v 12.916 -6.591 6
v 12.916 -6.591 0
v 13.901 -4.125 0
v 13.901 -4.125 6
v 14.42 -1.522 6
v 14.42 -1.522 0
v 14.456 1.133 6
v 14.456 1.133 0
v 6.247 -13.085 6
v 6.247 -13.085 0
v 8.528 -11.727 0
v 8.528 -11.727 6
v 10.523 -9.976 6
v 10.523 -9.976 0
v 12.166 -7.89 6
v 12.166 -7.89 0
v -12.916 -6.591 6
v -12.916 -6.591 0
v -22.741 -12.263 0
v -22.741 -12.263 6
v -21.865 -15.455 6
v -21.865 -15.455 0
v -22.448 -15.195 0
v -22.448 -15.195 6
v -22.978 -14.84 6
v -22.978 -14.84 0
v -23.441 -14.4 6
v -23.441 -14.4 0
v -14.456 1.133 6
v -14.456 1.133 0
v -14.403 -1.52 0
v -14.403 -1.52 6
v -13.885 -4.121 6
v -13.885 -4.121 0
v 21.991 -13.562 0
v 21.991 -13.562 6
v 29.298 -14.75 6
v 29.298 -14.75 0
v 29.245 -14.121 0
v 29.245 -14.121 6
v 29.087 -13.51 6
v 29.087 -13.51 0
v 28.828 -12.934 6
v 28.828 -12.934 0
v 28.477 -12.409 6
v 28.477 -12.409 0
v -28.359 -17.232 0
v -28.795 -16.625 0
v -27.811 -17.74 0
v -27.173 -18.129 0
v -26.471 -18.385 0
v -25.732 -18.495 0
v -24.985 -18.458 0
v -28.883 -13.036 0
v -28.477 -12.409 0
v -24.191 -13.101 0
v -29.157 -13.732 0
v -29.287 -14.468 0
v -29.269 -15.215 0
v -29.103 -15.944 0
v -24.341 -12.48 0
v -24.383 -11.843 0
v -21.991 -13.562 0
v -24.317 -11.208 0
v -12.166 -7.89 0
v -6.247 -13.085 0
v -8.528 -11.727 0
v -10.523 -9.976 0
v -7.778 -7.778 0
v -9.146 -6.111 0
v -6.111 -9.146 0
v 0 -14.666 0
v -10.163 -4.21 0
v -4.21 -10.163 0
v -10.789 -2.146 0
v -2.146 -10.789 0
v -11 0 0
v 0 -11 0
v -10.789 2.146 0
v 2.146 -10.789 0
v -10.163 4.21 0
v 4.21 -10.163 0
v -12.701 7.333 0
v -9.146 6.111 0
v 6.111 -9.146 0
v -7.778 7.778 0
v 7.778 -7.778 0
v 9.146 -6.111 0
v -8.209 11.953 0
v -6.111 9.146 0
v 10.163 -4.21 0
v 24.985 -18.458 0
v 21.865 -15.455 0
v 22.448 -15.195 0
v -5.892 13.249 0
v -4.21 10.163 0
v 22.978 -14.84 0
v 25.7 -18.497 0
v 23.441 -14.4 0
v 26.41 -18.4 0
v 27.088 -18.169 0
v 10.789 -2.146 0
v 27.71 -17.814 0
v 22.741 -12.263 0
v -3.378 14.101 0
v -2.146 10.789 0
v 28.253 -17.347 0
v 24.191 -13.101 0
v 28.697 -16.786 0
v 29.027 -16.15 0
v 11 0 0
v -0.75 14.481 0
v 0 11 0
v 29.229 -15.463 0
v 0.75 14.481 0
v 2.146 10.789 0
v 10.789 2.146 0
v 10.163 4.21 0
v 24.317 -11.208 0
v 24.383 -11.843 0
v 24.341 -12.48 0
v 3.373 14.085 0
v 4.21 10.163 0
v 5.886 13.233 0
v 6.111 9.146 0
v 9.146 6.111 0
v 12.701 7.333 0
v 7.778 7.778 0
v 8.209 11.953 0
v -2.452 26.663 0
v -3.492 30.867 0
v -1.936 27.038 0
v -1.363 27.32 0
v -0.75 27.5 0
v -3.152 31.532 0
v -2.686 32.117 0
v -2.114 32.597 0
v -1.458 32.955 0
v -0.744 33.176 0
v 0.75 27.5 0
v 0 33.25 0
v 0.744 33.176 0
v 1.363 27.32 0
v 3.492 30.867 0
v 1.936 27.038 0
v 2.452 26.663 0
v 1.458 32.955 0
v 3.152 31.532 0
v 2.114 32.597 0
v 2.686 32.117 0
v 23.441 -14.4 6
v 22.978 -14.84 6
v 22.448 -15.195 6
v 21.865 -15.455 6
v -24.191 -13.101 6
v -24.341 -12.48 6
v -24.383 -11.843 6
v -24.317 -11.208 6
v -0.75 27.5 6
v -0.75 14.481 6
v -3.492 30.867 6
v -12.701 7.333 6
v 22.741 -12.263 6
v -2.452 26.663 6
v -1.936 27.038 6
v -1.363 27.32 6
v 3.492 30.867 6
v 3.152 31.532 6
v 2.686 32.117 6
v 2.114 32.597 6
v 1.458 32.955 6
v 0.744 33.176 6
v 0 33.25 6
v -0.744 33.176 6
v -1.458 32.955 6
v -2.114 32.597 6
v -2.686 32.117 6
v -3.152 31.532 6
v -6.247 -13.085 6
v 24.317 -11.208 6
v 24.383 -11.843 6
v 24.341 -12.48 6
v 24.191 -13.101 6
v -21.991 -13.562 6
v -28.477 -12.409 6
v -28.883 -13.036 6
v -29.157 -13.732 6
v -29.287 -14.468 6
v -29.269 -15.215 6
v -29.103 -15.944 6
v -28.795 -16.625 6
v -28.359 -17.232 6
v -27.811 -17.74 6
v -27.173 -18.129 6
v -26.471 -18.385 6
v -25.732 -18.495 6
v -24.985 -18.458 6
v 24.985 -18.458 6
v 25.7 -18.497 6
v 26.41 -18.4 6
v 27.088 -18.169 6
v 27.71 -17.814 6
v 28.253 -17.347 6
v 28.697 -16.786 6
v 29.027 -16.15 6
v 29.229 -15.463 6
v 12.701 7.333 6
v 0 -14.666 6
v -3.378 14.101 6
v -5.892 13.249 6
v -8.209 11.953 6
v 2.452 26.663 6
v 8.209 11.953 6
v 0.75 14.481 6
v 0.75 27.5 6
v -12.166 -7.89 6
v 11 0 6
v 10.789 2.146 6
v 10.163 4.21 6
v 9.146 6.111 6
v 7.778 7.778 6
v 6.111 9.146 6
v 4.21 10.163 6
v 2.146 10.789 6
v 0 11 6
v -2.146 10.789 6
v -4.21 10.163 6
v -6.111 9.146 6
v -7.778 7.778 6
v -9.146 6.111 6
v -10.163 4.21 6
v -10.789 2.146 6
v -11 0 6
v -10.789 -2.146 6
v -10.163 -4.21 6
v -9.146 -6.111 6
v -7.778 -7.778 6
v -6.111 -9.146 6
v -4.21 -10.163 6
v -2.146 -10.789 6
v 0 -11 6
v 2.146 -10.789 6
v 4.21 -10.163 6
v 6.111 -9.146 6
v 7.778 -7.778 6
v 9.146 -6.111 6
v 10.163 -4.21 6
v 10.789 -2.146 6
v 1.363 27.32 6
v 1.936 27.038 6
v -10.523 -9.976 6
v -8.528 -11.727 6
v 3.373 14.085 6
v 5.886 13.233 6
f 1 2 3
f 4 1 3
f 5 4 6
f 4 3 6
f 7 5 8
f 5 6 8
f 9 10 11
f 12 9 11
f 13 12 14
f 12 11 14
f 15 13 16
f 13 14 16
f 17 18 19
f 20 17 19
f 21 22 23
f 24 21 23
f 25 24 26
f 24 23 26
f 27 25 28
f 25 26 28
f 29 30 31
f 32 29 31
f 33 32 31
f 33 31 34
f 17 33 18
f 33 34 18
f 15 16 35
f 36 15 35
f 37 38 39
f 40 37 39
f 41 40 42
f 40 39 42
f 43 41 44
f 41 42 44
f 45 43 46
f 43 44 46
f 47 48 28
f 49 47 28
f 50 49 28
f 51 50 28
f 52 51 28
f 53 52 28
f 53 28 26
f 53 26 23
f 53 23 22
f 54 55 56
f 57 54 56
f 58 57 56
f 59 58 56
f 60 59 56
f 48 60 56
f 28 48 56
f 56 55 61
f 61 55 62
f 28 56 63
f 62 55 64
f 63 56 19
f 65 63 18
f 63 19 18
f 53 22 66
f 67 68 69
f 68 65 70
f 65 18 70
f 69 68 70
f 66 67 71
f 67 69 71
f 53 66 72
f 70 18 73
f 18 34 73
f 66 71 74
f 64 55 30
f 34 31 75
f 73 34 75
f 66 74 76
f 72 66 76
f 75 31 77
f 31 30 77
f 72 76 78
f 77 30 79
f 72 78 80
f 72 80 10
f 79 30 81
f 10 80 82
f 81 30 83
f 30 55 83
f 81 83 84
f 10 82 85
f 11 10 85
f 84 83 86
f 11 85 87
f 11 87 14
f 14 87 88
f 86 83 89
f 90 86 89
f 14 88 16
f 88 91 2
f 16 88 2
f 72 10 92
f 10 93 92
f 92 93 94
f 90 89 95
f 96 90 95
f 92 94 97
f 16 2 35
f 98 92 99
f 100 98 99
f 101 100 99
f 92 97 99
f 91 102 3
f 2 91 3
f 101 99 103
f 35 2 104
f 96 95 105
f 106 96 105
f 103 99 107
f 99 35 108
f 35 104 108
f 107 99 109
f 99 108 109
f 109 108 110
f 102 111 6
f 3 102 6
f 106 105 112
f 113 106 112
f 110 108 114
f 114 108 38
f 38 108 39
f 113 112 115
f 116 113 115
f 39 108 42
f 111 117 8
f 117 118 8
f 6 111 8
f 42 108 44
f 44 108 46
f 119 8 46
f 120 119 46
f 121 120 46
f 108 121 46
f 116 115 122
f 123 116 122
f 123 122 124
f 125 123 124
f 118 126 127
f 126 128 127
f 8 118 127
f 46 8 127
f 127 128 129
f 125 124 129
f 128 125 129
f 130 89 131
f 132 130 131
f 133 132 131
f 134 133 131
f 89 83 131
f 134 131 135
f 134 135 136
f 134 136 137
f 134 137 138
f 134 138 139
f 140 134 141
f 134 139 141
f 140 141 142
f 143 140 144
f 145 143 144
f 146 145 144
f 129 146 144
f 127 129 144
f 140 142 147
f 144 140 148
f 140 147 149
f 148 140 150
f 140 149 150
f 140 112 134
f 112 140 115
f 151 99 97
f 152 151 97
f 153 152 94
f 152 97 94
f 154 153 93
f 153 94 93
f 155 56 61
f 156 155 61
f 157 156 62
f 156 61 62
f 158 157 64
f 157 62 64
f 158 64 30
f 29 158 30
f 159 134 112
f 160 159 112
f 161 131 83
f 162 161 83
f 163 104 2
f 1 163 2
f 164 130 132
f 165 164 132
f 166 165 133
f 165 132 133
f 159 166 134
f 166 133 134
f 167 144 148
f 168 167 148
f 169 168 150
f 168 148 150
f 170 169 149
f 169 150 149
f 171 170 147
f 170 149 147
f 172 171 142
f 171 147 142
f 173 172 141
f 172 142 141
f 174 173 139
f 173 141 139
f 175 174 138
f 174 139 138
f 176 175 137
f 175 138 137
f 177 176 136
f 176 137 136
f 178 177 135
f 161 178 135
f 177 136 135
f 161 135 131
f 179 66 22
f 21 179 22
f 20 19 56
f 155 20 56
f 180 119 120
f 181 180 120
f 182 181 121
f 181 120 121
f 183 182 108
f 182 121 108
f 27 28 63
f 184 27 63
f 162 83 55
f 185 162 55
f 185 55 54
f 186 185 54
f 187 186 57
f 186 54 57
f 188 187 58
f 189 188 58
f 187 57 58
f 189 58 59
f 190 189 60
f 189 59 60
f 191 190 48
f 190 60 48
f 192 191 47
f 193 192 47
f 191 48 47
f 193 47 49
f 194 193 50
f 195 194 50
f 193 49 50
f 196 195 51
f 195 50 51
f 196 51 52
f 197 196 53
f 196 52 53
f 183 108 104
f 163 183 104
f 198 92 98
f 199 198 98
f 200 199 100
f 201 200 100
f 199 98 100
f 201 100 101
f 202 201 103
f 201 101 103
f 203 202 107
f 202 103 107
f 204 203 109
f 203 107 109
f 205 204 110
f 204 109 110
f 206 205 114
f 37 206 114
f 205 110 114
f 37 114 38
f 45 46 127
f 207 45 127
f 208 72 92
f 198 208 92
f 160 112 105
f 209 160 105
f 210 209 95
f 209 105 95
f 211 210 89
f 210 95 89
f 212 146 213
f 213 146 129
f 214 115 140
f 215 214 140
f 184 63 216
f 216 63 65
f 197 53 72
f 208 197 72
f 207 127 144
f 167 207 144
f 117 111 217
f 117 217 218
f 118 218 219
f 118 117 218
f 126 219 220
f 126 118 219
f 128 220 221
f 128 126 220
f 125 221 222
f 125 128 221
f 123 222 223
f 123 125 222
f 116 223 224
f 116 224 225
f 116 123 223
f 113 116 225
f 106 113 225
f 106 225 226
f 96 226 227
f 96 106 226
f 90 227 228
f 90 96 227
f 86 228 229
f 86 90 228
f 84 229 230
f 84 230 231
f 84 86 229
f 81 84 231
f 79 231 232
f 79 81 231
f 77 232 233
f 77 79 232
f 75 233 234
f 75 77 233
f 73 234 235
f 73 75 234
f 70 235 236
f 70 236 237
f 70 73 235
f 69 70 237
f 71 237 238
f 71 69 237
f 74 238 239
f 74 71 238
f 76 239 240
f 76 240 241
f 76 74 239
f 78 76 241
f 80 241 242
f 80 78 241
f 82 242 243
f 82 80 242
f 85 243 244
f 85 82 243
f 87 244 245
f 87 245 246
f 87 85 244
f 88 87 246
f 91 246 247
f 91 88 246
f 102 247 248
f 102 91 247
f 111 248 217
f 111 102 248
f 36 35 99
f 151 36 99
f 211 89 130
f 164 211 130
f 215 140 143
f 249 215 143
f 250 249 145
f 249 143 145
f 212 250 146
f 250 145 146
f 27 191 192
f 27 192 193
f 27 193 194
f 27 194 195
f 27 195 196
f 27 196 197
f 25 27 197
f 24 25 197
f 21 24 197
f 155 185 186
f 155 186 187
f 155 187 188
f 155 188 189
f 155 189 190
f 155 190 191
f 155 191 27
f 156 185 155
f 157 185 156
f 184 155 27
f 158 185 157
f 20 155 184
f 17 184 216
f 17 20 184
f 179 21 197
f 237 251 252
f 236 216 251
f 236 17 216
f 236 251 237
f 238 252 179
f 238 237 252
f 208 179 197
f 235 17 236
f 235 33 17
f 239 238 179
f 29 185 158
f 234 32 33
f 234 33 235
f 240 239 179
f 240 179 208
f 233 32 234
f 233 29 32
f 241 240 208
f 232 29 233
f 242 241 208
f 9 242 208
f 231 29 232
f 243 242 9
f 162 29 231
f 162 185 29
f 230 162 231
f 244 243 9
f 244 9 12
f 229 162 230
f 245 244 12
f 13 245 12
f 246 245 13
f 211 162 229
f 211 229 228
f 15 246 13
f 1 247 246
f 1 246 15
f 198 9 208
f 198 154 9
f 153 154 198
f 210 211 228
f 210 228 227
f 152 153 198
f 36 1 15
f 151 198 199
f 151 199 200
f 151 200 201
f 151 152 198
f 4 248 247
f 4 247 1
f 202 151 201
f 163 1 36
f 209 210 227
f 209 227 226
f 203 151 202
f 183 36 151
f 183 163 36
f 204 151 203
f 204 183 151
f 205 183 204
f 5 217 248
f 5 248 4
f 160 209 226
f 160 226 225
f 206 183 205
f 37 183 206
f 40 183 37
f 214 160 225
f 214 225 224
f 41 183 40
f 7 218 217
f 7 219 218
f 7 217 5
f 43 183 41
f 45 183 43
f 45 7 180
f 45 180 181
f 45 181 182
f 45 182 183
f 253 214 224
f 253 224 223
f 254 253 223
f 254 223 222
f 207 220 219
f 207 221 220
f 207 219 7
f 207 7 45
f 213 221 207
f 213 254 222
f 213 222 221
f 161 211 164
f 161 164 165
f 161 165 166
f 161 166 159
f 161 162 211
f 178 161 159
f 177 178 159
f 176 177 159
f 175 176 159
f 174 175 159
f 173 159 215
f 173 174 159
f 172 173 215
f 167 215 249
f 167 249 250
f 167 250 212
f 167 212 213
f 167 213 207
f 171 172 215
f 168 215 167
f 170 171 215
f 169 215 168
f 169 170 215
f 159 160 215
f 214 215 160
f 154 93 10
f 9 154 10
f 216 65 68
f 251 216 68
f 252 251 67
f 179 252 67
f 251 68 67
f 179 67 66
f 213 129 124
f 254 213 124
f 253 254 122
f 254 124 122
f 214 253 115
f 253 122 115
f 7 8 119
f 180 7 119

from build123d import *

# Parameters (mm, degrees)
F0_R     = 11
F1_DEPTH = 6


with BuildPart() as f1:
    # F0 (on Top) → F1 (new body)
    with BuildSketch(Plane.XY):
        with BuildLine():
            Line((-23.441037, -14.399715), (-21.990769, -13.562402))
            ThreePointArc((-21.990769, -13.562402), (-22.300154, -12.875), (-22.740769, -12.263364))
            Line((-22.740769, -12.263364), (-24.191037, -13.100677))
            ThreePointArc((-24.191037, -13.100677), (-24.375767, -12.162283), (-24.317114, -11.207679))
            ThreePointArc((-24.317114, -11.207679), (-26.5881, -11.1472), (-28.47727, -12.408973))
            ThreePointArc((-28.47727, -12.408973), (-28.795345, -16.625), (-24.98512, -18.457553))
            ThreePointArc((-24.98512, -18.457553), (-22.947808, -17.45237), (-21.864692, -15.455399))
            ThreePointArc((-21.864692, -15.455399), (-22.720729, -15.028892), (-23.441037, -14.399715))
        make_face()
        with BuildLine():
            Line((-21.990769, -13.562402), (-12.165559, -7.889814))
            ThreePointArc((-12.165559, -7.889814), (-9.565708, -10.89712), (-6.246866, -13.085361))
            Line((-6.246866, -13.085361), (-21.864692, -15.455399))
            ThreePointArc((-21.864692, -15.455399), (-22.947808, -17.45237), (-24.98512, -18.457553))
            Line((-24.98512, -18.457553), (0, -14.666008))
            Line((0, -14.666008), (24.98512, -18.457553))
            ThreePointArc((24.98512, -18.457553), (22.947808, -17.45237), (21.864692, -15.455399))
            Line((21.864692, -15.455399), (6.246866, -13.085361))
            ThreePointArc((6.246866, -13.085361), (9.565708, -10.89712), (12.165559, -7.889814))
            Line((12.165559, -7.889814), (21.990769, -13.562402))
            ThreePointArc((21.990769, -13.562402), (22.300154, -12.875), (22.740769, -12.263364))
            Line((22.740769, -12.263364), (12.915559, -6.590776))
            ThreePointArc((12.915559, -6.590776), (14.220037, -2.835586), (14.455688, 1.132736))
            Line((14.455688, 1.132736), (24.317114, -11.207679))
            ThreePointArc((24.317114, -11.207679), (26.5881, -11.1472), (28.47727, -12.408973))
            Line((28.47727, -12.408973), (12.701135, 7.333004))
            Line((12.701135, 7.333004), (3.49215, 30.866525))
            ThreePointArc((3.49215, 30.866525), (0, 33.25), (-3.49215, 30.866525))
            Line((-3.49215, 30.866525), (-12.701135, 7.333004))
            Line((-12.701135, 7.333004), (-28.47727, -12.408973))
            ThreePointArc((-28.47727, -12.408973), (-26.5881, -11.1472), (-24.317114, -11.207679))
            Line((-24.317114, -11.207679), (-14.455688, 1.132736))
            ThreePointArc((-14.455688, 1.132736), (-14.201564, -2.831903), (-12.915559, -6.590776))
            Line((-12.915559, -6.590776), (-22.740769, -12.263364))
            ThreePointArc((-22.740769, -12.263364), (-22.300154, -12.875), (-21.990769, -13.562402))
        make_face()
        Circle(F0_R, mode=Mode.SUBTRACT)
        with BuildLine():
            Line((-8.208822, 11.952625), (-2.452422, 26.663078))
            ThreePointArc((-2.452422, 26.663078), (-1.655038, 27.191175), (-0.75, 27.500391))
            Line((-0.75, 27.500391), (-0.75, 14.48059))
            ThreePointArc((-0.75, 14.48059), (-4.654329, 13.732706), (-8.208822, 11.952625))
        make_face(mode=Mode.SUBTRACT)
        with BuildLine():
            ThreePointArc((0.75, 27.500391), (1.655038, 27.191175), (2.452422, 26.663078))
            Line((2.452422, 26.663078), (8.208822, 11.952625))
            ThreePointArc((8.208822, 11.952625), (4.648282, 13.714866), (0.75, 14.48059))
            Line((0.75, 14.48059), (0.75, 27.500391))
        make_face(mode=Mode.SUBTRACT)
        with BuildLine():
            ThreePointArc((21.864692, -15.455399), (22.947808, -17.45237), (24.98512, -18.457553))
            ThreePointArc((24.98512, -18.457553), (27.992401, -17.593621), (29.297749, -14.75))
            ThreePointArc((29.297749, -14.75), (29.08669, -13.509678), (28.47727, -12.408973))
            ThreePointArc((28.47727, -12.408973), (26.5881, -11.1472), (24.317114, -11.207679))
            ThreePointArc((24.317114, -11.207679), (24.375767, -12.162283), (24.191037, -13.100677))
            Line((24.191037, -13.100677), (22.740769, -12.263364))
            ThreePointArc((22.740769, -12.263364), (22.300154, -12.875), (21.990769, -13.562402))
            Line((21.990769, -13.562402), (23.441037, -14.399715))
            ThreePointArc((23.441037, -14.399715), (22.720729, -15.028892), (21.864692, -15.455399))
        make_face()
    extrude(amount=F1_DEPTH)


solid = f1.part
